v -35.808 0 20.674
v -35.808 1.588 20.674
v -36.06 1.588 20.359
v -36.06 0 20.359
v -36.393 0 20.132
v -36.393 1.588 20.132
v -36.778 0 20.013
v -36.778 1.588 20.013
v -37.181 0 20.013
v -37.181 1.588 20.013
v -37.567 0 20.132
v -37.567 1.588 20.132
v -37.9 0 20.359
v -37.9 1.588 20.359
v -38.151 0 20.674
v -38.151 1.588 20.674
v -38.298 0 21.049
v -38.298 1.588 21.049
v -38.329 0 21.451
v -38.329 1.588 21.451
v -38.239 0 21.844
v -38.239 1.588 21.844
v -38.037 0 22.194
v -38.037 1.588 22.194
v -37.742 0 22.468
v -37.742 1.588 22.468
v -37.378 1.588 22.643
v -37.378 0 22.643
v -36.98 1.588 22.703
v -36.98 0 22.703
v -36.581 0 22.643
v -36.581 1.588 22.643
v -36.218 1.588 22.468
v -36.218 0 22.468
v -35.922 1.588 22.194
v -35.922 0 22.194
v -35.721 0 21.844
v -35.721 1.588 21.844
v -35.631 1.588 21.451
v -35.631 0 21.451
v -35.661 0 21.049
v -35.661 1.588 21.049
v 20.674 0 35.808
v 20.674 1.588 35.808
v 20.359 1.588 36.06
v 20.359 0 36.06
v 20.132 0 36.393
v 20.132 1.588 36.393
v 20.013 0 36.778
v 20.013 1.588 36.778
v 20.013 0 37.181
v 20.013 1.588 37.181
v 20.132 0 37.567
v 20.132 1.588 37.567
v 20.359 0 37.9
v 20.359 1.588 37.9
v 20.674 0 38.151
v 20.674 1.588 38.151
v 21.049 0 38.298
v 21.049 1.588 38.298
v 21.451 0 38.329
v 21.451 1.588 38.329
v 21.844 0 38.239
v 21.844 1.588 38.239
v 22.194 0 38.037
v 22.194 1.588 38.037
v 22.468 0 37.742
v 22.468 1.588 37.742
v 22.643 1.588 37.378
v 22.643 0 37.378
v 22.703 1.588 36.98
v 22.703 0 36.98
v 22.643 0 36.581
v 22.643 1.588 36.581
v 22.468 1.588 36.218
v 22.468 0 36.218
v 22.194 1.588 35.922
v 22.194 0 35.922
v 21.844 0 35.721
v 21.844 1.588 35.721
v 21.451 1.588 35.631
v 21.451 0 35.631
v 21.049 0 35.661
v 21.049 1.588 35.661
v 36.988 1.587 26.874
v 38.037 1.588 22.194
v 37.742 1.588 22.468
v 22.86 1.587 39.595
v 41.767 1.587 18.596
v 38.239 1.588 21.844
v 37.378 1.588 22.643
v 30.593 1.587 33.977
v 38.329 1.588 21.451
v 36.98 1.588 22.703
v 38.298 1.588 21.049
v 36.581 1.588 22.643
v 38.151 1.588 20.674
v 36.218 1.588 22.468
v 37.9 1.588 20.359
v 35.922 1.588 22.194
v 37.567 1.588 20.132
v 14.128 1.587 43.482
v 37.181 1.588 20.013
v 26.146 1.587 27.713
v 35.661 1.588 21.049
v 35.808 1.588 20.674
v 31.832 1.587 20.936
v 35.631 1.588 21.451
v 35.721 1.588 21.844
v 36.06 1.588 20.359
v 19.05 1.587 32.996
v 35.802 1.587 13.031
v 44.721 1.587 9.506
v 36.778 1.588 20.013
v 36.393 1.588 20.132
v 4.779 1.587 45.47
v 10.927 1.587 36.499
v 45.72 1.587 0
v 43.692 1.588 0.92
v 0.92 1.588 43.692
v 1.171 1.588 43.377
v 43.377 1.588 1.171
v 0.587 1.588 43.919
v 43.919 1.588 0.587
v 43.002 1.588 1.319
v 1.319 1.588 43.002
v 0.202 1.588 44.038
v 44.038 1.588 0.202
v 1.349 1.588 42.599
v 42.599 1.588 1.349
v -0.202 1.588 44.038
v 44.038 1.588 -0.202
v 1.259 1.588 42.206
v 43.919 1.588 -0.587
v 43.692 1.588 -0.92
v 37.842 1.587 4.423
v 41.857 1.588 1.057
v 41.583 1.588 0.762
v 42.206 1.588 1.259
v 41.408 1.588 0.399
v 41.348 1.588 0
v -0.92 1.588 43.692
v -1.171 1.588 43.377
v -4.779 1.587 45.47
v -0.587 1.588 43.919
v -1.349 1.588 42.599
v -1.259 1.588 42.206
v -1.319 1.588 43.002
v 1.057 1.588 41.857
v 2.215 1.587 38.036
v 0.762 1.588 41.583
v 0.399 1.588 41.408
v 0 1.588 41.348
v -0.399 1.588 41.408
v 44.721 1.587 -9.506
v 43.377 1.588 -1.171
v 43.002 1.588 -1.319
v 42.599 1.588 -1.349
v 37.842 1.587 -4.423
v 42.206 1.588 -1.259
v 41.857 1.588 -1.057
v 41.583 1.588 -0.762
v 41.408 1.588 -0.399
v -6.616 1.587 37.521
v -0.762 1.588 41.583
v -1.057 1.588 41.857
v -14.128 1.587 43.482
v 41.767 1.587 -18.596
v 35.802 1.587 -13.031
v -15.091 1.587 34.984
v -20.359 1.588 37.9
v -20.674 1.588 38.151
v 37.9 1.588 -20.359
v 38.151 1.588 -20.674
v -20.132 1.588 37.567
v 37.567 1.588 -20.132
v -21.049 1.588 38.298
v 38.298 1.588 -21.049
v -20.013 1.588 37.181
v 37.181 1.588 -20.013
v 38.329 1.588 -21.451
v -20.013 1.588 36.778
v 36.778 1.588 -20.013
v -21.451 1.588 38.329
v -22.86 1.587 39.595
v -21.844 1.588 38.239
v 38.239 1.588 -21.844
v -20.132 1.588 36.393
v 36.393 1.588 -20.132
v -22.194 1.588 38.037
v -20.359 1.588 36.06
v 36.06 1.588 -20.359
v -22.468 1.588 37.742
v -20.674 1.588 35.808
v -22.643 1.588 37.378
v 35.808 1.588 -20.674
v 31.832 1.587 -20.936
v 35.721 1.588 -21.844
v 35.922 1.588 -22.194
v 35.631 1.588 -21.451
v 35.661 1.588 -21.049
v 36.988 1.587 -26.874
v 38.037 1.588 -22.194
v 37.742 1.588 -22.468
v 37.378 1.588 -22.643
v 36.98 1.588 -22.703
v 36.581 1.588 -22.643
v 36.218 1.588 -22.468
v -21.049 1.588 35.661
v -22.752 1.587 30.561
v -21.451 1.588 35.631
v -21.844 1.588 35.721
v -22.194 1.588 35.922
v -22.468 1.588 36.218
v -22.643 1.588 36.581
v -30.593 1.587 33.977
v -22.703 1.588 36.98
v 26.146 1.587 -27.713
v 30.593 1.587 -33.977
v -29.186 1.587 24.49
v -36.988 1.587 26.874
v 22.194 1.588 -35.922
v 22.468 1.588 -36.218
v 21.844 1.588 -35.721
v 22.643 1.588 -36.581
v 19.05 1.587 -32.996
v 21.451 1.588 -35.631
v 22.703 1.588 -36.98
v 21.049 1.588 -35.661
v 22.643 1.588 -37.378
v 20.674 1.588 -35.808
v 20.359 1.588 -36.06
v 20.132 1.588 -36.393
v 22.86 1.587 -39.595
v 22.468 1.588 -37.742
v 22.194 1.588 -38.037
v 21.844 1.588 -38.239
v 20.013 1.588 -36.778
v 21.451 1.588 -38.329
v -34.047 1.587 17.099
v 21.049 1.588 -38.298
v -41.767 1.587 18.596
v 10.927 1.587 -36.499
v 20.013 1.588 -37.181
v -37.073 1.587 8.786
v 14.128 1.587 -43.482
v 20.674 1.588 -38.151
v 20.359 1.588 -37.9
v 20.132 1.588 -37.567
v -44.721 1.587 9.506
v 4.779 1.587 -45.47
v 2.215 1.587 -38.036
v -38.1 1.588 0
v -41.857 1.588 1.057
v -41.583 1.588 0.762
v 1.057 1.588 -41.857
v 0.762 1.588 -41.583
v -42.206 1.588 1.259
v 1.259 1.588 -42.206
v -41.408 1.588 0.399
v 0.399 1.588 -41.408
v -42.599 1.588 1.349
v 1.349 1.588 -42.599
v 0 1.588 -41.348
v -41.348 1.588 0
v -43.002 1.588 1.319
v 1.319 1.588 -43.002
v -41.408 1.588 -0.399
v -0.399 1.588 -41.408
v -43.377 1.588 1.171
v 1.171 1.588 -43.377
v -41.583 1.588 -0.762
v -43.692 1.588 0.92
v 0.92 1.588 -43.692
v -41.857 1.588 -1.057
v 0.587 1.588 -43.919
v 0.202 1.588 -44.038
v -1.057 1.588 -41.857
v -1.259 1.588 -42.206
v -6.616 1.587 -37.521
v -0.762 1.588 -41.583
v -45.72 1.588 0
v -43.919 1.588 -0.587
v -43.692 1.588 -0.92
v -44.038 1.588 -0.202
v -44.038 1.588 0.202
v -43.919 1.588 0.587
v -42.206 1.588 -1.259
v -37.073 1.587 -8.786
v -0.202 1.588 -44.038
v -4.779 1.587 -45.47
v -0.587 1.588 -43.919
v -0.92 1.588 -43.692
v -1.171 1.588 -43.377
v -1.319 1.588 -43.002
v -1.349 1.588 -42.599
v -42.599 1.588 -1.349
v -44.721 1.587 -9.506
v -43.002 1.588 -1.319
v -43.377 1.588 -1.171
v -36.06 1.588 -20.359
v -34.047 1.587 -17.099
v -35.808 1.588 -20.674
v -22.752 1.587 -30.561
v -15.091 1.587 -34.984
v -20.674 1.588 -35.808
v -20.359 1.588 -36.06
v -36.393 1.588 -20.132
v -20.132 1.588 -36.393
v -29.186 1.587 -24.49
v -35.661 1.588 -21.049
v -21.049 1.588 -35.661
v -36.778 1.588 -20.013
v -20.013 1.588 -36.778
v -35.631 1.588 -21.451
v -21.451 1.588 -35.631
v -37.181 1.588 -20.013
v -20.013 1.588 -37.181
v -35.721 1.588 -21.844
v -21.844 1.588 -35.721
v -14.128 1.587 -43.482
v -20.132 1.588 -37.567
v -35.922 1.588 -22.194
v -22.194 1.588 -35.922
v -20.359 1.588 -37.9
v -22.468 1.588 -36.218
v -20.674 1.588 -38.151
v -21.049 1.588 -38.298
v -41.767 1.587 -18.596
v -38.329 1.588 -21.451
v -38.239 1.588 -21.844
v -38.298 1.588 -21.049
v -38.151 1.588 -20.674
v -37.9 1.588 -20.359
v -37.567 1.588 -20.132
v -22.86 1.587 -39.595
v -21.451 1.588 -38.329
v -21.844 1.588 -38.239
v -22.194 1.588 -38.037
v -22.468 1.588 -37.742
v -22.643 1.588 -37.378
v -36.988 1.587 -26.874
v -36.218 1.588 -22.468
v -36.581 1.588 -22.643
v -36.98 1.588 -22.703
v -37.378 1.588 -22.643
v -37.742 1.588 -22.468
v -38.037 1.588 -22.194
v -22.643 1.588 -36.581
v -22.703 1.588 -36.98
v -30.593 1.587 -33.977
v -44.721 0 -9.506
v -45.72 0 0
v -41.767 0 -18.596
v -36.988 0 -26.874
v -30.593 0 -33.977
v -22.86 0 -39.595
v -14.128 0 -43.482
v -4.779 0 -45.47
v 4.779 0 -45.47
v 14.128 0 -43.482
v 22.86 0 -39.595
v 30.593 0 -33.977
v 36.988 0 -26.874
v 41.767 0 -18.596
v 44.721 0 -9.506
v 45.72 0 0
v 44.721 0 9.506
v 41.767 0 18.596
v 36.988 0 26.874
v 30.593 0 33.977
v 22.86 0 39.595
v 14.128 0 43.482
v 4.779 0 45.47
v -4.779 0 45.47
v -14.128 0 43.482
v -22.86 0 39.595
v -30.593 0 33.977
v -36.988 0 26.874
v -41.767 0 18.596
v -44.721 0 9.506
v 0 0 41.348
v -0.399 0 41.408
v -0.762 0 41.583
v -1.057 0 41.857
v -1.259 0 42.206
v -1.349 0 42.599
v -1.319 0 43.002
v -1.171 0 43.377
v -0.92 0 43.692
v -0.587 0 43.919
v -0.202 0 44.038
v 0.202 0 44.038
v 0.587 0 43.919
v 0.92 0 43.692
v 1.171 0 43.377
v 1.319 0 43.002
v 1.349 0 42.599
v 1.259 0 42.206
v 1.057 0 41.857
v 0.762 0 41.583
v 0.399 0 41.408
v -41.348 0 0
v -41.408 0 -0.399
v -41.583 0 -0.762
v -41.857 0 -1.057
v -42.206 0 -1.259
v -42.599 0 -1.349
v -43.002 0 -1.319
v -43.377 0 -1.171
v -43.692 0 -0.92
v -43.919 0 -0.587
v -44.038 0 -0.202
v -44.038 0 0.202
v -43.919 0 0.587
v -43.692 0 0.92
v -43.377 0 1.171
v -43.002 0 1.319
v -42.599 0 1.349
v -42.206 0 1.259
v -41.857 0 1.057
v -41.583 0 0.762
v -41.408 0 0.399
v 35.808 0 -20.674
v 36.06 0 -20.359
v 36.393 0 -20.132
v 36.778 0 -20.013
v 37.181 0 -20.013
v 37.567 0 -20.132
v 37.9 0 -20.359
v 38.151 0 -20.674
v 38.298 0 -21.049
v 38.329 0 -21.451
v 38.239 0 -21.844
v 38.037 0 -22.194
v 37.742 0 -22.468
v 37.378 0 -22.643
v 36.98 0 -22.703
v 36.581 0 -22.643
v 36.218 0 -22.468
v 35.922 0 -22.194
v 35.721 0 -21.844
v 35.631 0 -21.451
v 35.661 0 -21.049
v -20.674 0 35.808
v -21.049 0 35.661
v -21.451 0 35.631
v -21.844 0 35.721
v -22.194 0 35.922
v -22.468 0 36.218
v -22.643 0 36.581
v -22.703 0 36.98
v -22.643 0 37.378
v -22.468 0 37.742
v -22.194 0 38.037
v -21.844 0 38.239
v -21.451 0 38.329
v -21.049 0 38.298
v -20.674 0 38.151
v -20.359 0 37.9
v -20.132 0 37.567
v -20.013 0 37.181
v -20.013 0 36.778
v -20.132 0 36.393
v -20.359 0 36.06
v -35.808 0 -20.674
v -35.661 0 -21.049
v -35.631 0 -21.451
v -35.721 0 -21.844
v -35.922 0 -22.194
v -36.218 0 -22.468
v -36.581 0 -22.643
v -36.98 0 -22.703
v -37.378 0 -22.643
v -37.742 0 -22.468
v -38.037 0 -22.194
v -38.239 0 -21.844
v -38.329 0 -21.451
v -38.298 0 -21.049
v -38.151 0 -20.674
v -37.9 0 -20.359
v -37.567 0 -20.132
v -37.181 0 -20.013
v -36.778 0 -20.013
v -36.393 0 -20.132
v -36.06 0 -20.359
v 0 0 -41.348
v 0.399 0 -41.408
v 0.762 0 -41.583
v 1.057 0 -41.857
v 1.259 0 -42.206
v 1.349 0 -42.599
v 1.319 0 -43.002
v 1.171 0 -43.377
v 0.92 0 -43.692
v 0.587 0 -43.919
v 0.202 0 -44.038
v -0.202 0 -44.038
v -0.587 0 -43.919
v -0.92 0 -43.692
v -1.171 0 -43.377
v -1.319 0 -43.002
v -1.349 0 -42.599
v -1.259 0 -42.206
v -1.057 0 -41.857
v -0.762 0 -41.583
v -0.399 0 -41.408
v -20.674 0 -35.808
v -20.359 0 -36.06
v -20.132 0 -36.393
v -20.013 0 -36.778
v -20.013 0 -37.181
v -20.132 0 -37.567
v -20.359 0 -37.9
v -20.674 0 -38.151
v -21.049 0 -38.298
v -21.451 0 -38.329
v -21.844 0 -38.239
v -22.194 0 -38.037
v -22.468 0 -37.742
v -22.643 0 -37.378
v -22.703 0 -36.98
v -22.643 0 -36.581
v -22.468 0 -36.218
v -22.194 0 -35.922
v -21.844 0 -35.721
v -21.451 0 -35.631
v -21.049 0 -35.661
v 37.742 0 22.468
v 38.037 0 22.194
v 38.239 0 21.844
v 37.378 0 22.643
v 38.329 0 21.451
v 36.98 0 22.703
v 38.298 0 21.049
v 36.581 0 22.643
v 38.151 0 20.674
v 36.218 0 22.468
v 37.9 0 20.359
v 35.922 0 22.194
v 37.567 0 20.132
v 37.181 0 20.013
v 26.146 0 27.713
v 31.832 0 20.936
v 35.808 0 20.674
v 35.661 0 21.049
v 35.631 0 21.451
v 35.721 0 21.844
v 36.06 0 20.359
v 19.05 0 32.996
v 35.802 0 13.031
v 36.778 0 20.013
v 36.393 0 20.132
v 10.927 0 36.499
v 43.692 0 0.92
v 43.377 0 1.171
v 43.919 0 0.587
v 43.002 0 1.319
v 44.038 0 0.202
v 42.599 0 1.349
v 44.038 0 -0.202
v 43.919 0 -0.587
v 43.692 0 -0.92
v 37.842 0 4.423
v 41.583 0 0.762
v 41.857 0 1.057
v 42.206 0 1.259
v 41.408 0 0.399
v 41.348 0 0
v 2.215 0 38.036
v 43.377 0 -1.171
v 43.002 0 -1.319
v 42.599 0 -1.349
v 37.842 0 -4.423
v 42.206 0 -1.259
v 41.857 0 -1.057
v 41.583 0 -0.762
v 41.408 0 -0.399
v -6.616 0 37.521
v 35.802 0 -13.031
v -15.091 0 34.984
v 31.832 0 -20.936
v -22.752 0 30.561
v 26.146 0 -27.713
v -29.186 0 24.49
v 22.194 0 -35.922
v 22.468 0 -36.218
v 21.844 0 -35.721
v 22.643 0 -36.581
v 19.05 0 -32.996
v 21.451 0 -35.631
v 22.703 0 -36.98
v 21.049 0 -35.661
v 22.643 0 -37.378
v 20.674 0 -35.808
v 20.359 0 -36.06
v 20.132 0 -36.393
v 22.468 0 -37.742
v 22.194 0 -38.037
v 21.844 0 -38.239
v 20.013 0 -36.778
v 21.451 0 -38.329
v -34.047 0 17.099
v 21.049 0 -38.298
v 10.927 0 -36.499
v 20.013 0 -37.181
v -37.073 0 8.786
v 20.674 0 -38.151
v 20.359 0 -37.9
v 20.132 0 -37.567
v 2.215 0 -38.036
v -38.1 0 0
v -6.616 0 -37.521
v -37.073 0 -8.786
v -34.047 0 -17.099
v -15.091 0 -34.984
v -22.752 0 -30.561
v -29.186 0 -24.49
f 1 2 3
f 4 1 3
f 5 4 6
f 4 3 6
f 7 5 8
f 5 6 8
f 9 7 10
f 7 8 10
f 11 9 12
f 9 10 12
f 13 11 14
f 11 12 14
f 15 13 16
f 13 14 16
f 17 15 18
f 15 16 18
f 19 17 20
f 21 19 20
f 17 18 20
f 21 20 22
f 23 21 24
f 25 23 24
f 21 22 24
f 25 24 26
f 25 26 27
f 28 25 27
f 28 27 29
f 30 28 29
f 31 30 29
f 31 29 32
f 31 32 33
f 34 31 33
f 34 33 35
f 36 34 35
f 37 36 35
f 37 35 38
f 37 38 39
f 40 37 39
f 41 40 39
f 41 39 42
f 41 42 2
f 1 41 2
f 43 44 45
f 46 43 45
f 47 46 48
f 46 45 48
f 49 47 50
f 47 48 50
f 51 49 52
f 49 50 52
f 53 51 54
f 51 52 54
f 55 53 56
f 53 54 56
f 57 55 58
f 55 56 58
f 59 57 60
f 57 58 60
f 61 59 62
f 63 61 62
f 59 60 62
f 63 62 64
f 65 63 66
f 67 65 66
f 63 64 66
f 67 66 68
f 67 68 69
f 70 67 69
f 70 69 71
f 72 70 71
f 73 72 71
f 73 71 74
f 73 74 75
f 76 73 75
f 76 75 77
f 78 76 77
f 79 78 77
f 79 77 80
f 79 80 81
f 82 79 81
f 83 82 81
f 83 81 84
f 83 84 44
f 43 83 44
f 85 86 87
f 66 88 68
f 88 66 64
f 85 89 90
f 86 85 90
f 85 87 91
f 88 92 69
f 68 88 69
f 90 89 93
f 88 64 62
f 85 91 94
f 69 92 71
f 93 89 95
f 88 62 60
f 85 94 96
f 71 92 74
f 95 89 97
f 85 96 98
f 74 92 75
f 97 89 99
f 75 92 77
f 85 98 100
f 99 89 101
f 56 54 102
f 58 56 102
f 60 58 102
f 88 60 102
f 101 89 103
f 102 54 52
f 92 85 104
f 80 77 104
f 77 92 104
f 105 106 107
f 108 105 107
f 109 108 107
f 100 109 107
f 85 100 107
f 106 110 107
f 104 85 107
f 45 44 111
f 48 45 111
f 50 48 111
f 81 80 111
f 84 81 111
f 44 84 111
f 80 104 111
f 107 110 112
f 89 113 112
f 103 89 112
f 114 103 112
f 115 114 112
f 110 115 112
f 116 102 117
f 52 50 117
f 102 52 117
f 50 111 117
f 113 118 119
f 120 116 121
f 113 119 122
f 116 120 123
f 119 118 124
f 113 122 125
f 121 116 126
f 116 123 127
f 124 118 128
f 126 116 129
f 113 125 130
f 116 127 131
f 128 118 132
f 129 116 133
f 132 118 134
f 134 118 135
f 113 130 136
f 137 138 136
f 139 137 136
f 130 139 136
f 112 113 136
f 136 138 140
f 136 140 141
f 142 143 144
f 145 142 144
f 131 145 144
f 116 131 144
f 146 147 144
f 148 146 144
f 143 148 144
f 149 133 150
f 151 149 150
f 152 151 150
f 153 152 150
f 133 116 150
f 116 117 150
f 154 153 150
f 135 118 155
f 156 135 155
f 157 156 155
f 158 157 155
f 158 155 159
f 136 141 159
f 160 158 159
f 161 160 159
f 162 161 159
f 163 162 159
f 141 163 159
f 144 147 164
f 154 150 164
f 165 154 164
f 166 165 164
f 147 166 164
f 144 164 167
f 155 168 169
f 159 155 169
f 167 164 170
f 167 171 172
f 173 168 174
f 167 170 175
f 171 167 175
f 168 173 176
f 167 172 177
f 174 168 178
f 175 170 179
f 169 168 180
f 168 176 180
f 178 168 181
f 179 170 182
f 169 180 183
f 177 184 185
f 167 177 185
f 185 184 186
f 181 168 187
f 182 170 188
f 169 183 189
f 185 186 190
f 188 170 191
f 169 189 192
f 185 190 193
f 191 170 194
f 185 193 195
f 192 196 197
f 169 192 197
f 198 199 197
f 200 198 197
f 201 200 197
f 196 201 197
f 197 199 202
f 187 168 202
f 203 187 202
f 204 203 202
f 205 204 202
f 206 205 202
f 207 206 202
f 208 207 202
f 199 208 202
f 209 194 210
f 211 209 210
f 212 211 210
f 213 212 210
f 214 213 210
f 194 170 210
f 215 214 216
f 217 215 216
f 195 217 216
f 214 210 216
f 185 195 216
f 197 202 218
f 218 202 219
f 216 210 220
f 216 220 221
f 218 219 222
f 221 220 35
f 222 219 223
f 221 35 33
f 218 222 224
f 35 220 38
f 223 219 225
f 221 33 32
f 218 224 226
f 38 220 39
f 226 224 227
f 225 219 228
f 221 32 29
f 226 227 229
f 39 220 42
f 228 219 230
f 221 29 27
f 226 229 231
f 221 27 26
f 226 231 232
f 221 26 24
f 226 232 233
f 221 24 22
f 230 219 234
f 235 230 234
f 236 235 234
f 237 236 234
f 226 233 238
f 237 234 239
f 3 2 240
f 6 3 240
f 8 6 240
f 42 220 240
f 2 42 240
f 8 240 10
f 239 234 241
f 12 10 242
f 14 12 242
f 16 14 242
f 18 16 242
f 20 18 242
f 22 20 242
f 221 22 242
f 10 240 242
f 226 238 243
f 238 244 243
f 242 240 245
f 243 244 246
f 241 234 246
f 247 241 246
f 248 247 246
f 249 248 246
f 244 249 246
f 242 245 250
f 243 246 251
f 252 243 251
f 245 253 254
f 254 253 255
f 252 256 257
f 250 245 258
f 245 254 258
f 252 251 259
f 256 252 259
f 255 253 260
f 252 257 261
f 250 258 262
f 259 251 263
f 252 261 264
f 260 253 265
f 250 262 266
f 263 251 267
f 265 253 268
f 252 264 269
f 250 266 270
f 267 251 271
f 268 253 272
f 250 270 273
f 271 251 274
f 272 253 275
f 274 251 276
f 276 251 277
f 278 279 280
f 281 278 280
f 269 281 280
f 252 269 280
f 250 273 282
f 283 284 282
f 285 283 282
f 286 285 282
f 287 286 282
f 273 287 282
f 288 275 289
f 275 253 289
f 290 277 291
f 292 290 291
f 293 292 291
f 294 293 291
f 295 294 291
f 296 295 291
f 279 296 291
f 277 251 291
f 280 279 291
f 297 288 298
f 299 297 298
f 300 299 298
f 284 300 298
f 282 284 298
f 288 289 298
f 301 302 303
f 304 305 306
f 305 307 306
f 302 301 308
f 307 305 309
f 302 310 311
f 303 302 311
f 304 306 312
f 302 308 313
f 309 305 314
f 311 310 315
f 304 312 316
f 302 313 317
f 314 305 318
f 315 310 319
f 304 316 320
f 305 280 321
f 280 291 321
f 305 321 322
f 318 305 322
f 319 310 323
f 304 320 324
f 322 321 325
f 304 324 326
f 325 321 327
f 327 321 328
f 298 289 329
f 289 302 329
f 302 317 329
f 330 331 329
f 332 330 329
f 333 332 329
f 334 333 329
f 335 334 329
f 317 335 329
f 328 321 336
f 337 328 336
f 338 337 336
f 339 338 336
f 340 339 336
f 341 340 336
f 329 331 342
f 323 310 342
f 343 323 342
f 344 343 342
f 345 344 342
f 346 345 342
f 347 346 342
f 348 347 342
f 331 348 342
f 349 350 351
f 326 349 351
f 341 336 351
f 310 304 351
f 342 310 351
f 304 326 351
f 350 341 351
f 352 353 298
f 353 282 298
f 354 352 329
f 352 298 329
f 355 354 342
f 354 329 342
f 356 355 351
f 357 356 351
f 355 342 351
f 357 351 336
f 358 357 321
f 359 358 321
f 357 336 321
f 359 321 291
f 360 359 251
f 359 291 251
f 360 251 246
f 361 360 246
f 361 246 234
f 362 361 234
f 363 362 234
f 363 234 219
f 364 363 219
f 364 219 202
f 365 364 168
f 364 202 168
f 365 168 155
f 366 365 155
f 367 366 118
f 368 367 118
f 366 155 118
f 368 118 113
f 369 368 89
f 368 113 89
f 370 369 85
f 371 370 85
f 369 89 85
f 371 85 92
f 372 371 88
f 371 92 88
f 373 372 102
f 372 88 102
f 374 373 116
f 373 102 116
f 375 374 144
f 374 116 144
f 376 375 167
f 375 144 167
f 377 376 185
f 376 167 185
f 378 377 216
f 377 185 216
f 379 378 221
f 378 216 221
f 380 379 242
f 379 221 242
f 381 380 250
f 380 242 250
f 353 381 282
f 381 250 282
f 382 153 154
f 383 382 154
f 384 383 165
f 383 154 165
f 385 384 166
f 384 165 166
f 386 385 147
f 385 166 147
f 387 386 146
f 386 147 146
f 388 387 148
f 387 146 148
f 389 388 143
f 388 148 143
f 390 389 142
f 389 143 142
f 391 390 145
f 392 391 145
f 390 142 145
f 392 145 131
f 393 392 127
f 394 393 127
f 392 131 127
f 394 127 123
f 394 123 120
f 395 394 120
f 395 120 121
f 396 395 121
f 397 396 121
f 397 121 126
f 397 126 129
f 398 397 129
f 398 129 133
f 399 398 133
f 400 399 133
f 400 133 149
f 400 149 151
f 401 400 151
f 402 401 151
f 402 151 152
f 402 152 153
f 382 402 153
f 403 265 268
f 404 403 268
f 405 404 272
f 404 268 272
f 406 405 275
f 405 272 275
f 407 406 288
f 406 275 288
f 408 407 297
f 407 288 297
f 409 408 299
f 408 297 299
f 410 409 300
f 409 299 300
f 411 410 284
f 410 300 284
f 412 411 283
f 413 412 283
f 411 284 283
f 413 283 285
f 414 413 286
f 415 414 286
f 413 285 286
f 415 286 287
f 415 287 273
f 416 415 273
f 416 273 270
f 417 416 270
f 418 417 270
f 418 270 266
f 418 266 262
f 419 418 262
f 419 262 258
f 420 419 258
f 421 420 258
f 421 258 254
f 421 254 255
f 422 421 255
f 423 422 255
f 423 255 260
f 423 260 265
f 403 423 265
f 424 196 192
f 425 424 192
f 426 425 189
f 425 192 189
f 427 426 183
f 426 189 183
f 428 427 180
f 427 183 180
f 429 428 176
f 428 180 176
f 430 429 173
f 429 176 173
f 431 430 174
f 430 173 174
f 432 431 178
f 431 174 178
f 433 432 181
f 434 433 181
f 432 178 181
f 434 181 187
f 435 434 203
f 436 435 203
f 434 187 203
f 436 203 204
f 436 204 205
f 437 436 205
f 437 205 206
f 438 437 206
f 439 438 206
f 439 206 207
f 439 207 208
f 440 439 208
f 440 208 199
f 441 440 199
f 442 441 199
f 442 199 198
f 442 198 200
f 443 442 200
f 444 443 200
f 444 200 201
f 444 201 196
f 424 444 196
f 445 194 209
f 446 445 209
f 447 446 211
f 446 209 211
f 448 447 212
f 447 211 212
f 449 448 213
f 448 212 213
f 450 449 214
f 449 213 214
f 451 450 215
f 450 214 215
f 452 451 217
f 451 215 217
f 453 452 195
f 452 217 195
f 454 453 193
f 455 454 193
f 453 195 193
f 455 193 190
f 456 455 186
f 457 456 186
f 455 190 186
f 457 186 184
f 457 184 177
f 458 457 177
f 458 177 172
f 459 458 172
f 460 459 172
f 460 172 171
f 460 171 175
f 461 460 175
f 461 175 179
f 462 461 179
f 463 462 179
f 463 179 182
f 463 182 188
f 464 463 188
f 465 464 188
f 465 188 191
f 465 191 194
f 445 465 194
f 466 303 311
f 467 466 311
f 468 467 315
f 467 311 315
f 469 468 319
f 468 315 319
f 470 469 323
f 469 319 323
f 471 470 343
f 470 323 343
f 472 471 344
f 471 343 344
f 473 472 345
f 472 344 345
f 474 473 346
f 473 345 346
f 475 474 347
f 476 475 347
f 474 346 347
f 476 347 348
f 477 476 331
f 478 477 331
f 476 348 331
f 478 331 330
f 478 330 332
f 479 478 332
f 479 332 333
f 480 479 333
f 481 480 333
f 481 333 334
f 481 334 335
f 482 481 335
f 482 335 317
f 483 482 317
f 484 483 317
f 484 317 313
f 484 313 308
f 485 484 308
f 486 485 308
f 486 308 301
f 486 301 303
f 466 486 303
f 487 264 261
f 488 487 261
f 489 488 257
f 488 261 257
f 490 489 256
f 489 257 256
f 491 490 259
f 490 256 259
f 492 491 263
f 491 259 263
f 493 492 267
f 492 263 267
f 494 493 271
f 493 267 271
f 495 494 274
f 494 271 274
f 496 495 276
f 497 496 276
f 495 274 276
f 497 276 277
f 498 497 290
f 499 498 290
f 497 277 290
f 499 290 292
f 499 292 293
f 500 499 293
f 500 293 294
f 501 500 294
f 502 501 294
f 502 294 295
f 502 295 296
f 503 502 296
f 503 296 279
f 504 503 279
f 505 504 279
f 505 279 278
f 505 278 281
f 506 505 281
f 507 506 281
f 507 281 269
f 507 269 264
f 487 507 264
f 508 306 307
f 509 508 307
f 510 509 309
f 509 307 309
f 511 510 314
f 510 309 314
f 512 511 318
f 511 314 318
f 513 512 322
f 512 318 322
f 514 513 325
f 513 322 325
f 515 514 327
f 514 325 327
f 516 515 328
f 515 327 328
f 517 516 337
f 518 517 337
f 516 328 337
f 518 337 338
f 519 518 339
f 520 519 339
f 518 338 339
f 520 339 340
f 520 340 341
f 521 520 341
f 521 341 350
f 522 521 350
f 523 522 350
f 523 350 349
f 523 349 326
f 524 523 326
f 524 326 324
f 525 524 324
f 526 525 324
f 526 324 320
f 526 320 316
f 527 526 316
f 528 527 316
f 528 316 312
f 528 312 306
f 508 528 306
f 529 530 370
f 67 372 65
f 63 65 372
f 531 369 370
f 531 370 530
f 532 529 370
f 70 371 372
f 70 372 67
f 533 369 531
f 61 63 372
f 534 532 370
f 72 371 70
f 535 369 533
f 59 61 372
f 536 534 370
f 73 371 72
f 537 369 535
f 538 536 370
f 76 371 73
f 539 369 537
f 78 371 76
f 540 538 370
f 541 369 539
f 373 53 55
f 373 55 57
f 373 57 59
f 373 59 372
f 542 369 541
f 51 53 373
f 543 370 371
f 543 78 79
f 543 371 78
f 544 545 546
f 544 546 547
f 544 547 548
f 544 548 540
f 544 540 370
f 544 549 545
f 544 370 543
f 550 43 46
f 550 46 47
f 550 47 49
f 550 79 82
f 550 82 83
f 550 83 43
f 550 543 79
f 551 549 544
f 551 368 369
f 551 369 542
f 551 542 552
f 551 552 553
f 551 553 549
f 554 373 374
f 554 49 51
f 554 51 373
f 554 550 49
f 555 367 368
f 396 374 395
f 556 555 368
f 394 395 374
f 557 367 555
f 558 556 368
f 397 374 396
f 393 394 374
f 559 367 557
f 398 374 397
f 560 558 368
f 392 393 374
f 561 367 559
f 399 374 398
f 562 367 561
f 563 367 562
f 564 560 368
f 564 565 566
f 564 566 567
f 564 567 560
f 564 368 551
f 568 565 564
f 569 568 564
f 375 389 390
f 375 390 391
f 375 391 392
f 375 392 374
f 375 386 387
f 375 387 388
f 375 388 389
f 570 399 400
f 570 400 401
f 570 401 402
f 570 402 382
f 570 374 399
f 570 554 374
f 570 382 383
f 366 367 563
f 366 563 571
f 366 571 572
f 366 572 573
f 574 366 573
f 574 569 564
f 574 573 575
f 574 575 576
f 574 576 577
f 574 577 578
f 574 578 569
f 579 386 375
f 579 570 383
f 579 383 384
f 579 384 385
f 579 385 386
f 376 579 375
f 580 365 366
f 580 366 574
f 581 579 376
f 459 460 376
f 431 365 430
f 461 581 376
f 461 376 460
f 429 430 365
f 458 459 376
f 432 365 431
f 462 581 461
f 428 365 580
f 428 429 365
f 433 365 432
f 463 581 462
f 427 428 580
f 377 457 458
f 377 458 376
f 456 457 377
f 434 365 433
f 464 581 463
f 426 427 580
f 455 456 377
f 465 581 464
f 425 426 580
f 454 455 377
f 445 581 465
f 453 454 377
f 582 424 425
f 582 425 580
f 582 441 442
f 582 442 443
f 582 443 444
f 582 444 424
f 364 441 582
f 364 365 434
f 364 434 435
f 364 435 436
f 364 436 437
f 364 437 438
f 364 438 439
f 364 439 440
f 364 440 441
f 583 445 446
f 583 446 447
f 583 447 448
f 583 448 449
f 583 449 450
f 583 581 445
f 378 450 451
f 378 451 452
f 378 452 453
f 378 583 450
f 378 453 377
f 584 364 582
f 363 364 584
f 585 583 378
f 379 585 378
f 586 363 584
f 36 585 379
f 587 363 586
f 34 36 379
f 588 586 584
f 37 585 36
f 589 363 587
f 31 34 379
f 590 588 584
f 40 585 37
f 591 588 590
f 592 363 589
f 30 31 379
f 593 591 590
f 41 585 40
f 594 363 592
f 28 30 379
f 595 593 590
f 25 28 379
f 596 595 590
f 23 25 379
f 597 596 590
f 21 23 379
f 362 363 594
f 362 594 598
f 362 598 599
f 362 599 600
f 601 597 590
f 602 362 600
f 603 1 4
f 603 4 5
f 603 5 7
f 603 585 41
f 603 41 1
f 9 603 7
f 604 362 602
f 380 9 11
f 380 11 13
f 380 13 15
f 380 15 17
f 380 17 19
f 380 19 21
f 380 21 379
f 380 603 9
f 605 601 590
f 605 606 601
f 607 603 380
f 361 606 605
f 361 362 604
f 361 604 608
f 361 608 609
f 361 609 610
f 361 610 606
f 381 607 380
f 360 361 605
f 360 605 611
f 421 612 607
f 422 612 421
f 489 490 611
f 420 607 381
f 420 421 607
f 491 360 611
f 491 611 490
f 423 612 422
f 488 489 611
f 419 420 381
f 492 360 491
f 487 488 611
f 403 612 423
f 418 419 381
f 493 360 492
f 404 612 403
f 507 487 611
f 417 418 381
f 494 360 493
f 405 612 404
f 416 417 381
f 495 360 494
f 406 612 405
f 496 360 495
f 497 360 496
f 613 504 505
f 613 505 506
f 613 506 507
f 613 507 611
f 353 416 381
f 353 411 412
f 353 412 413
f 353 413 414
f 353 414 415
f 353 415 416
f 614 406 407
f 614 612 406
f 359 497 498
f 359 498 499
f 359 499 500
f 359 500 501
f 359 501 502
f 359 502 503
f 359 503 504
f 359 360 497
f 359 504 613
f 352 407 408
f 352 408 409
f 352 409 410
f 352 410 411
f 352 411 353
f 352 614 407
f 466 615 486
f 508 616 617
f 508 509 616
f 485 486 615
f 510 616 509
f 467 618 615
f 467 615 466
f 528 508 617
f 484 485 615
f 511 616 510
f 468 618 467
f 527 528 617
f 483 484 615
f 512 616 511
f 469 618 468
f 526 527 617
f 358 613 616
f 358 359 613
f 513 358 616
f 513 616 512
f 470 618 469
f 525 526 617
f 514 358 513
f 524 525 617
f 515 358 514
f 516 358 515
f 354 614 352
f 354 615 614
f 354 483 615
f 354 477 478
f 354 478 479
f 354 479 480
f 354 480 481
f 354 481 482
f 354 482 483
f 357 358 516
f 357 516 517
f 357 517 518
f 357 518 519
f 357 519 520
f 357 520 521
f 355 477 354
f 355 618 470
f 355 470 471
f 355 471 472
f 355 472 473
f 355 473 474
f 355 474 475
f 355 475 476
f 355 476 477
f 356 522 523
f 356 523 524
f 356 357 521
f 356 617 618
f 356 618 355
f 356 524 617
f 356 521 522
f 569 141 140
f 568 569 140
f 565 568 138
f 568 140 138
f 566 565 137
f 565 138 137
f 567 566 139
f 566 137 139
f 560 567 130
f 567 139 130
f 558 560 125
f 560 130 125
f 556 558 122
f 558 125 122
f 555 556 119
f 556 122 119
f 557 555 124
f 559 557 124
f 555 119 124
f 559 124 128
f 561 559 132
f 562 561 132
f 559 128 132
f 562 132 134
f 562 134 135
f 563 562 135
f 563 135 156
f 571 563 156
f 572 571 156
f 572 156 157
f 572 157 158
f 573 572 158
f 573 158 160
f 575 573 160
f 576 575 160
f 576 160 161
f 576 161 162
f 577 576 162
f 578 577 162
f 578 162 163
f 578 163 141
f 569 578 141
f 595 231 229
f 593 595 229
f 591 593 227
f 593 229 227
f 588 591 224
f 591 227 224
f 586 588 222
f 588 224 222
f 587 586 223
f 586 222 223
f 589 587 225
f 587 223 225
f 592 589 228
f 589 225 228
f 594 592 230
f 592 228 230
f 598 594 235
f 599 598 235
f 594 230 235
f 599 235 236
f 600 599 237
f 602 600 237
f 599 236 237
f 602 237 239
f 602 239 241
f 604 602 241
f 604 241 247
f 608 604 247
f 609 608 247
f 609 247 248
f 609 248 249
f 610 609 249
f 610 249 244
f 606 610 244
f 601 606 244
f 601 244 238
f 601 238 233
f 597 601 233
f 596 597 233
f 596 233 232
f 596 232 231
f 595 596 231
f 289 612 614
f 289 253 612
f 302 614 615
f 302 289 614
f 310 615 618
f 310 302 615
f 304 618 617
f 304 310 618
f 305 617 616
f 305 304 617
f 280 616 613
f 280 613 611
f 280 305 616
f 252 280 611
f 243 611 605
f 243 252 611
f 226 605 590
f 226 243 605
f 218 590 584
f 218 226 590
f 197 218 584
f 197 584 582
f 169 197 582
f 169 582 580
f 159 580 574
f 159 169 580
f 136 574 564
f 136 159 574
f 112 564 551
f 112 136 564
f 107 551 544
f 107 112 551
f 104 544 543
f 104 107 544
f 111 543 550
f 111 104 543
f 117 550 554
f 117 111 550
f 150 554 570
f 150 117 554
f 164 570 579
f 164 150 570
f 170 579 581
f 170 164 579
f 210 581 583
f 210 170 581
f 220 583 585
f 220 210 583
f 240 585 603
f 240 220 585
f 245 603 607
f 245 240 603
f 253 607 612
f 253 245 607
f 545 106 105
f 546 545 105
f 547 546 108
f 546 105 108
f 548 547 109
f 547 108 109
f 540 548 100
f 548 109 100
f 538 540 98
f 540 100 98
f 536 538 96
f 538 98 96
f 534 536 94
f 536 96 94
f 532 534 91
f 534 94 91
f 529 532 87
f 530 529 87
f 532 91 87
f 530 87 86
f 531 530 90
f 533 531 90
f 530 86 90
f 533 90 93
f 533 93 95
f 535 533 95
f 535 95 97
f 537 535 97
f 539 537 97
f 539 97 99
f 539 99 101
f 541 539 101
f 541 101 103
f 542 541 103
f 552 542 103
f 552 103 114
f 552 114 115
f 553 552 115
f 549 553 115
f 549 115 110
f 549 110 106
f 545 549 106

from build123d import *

# Parameters (mm, degrees)
SKETCH1_W                    = 7.62
SKETCH1_H                    = 1.5875
F_36_0_1065_DIAMETER_HOLE1_D = 2.7051
SCREW_PASSTHROUGHS_COUNT     = 12


with BuildPart() as part:
    # Sketch1 → Main (revolve)
    with BuildSketch(Plane.XY):
        with Locations((-41.91, 0.79375)):
            Rectangle(SKETCH1_W, SKETCH1_H)
    revolve(axis=Axis((0, 55, 0), (0, -1, 0)))

    # #36 (0.1065) Diameter Hole1 (through all)
    with Locations(Plane(origin=(0, 0, 0), x_dir=(-1, 0, 0), z_dir=(0, -1, 0))):
        with Locations((42.700575, 0)):
            f_36_0_1065_diameter_hole1 = Hole(F_36_0_1065_DIAMETER_HOLE1_D / 2)

    # Screw Passthroughs: #36 (0.1065) Diameter Hole1 ×12 about axis
    screw_passthroughs_axis = Axis((0, 0, 0), (0, 1, 0))
    for i in range(1, SCREW_PASSTHROUGHS_COUNT):
        add(f_36_0_1065_diameter_hole1.rotate(screw_passthroughs_axis, i * 360 / SCREW_PASSTHROUGHS_COUNT), mode=Mode.SUBTRACT)


solid = part.part
